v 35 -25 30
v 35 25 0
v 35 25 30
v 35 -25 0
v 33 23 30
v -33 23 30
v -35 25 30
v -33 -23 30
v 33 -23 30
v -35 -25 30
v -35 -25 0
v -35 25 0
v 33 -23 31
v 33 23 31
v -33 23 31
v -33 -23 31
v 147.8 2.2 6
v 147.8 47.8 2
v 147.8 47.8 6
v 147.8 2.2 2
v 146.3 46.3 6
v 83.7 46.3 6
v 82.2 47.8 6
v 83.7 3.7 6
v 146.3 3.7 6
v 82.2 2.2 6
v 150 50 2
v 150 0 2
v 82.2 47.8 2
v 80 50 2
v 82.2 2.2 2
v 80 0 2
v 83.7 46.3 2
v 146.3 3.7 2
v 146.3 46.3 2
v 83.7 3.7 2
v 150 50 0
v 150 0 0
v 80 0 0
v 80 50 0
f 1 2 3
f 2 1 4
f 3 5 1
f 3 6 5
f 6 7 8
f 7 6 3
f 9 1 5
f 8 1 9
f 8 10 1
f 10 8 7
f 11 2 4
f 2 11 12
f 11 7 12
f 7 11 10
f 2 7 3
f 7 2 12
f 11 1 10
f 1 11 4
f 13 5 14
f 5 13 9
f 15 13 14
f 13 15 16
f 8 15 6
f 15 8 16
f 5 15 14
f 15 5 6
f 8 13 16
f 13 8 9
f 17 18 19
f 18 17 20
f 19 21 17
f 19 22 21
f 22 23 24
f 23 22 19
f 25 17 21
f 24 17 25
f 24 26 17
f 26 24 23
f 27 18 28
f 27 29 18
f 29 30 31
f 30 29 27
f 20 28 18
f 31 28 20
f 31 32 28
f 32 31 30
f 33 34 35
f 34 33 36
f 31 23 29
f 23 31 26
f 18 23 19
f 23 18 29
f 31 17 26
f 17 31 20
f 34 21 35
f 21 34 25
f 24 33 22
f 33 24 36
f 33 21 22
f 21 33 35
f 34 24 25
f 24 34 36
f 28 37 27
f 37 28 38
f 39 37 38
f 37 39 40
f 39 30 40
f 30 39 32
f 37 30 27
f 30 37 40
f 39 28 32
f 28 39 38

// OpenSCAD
// Two-part enclosure for a small electronics board (Arduino temp logger)
// Part 1: open box, Part 2: lid printed upside down, side by side on the bed.
// Units: mm. Print orientation: both parts rest on the XY plane at z = 0.

// ---- Named dimensions (measured with calipers) ----
box_outer_x   = 70.0;   // box outer length (X)
box_outer_y   = 50.0;   // box outer width  (Y)
box_outer_z   = 30.0;   // box outer height (Z)
wall_t        = 2.0;    // wall thickness
floor_t       = 2.0;    // floor thickness
lid_plate_t   = 2.0;    // lid plate thickness
lid_lip_t     = 1.5;    // lid lip wall thickness
lid_lip_h     = 4.0;    // lid lip height
lid_lip_outer_x = 65.6; // lip outer length (X)
lid_lip_outer_y = 45.6; // lip outer width  (Y)
gap           = 10.0;   // gap between the two parts on the bed

// Derived values
box_inner_x   = box_outer_x - 2 * wall_t;   // 66
box_inner_y   = box_outer_y - 2 * wall_t;   // 46
box_inner_z   = box_outer_z - floor_t;      // 28 (interior height)
lip_inner_x   = lid_lip_outer_x - 2 * lid_lip_t; // 62.6
lip_inner_y   = lid_lip_outer_y - 2 * lid_lip_t; // 42.6

// ---- Part 1: the box (open top), centred on the origin ----
module box() {
    // Outer shell, centred at origin
    translate([-box_outer_x/2, -box_outer_y/2, 0])
        cube([box_outer_x, box_outer_y, box_outer_z]);
    difference() {
        // Interior cavity, open at the top (cavity extends 1 mm above the rim)
        translate([-box_inner_x/2, -box_inner_y/2, floor_t])
            cube([box_inner_x, box_inner_y, box_inner_z + 1]);
    }
}

// ---- Part 2: the lid, printed upside down ----
// Plate lies flat on the bed (z 0..2). The lip is a 1.5 mm wall, 4 mm tall,
// centred on the plate, with a 0.2 mm clearance per side vs. the box opening.
module lid() {
    // Plate, centred at origin
    translate([-box_outer_x/2, -box_outer_y/2, 0])
        cube([box_outer_x, box_outer_y, lid_plate_t]);
    // Lip: outer wall minus inner void (void extends 1 mm above the lip top)
    difference() {
        translate([-lid_lip_outer_x/2, -lid_lip_outer_y/2, lid_plate_t])
            cube([lid_lip_outer_x, lid_lip_outer_y, lid_lip_h]);
        translate([-lip_inner_x/2, -lip_inner_y/2, lid_plate_t])
            cube([lip_inner_x, lip_inner_y, lid_lip_h + 1]);
    }
}

// ---- Place both parts side by side on the bed, 10 mm apart ----
// Box centred at origin; lid on the +X side, centred at (115, 25).
box();
translate([115, 25, 0]) lid();
